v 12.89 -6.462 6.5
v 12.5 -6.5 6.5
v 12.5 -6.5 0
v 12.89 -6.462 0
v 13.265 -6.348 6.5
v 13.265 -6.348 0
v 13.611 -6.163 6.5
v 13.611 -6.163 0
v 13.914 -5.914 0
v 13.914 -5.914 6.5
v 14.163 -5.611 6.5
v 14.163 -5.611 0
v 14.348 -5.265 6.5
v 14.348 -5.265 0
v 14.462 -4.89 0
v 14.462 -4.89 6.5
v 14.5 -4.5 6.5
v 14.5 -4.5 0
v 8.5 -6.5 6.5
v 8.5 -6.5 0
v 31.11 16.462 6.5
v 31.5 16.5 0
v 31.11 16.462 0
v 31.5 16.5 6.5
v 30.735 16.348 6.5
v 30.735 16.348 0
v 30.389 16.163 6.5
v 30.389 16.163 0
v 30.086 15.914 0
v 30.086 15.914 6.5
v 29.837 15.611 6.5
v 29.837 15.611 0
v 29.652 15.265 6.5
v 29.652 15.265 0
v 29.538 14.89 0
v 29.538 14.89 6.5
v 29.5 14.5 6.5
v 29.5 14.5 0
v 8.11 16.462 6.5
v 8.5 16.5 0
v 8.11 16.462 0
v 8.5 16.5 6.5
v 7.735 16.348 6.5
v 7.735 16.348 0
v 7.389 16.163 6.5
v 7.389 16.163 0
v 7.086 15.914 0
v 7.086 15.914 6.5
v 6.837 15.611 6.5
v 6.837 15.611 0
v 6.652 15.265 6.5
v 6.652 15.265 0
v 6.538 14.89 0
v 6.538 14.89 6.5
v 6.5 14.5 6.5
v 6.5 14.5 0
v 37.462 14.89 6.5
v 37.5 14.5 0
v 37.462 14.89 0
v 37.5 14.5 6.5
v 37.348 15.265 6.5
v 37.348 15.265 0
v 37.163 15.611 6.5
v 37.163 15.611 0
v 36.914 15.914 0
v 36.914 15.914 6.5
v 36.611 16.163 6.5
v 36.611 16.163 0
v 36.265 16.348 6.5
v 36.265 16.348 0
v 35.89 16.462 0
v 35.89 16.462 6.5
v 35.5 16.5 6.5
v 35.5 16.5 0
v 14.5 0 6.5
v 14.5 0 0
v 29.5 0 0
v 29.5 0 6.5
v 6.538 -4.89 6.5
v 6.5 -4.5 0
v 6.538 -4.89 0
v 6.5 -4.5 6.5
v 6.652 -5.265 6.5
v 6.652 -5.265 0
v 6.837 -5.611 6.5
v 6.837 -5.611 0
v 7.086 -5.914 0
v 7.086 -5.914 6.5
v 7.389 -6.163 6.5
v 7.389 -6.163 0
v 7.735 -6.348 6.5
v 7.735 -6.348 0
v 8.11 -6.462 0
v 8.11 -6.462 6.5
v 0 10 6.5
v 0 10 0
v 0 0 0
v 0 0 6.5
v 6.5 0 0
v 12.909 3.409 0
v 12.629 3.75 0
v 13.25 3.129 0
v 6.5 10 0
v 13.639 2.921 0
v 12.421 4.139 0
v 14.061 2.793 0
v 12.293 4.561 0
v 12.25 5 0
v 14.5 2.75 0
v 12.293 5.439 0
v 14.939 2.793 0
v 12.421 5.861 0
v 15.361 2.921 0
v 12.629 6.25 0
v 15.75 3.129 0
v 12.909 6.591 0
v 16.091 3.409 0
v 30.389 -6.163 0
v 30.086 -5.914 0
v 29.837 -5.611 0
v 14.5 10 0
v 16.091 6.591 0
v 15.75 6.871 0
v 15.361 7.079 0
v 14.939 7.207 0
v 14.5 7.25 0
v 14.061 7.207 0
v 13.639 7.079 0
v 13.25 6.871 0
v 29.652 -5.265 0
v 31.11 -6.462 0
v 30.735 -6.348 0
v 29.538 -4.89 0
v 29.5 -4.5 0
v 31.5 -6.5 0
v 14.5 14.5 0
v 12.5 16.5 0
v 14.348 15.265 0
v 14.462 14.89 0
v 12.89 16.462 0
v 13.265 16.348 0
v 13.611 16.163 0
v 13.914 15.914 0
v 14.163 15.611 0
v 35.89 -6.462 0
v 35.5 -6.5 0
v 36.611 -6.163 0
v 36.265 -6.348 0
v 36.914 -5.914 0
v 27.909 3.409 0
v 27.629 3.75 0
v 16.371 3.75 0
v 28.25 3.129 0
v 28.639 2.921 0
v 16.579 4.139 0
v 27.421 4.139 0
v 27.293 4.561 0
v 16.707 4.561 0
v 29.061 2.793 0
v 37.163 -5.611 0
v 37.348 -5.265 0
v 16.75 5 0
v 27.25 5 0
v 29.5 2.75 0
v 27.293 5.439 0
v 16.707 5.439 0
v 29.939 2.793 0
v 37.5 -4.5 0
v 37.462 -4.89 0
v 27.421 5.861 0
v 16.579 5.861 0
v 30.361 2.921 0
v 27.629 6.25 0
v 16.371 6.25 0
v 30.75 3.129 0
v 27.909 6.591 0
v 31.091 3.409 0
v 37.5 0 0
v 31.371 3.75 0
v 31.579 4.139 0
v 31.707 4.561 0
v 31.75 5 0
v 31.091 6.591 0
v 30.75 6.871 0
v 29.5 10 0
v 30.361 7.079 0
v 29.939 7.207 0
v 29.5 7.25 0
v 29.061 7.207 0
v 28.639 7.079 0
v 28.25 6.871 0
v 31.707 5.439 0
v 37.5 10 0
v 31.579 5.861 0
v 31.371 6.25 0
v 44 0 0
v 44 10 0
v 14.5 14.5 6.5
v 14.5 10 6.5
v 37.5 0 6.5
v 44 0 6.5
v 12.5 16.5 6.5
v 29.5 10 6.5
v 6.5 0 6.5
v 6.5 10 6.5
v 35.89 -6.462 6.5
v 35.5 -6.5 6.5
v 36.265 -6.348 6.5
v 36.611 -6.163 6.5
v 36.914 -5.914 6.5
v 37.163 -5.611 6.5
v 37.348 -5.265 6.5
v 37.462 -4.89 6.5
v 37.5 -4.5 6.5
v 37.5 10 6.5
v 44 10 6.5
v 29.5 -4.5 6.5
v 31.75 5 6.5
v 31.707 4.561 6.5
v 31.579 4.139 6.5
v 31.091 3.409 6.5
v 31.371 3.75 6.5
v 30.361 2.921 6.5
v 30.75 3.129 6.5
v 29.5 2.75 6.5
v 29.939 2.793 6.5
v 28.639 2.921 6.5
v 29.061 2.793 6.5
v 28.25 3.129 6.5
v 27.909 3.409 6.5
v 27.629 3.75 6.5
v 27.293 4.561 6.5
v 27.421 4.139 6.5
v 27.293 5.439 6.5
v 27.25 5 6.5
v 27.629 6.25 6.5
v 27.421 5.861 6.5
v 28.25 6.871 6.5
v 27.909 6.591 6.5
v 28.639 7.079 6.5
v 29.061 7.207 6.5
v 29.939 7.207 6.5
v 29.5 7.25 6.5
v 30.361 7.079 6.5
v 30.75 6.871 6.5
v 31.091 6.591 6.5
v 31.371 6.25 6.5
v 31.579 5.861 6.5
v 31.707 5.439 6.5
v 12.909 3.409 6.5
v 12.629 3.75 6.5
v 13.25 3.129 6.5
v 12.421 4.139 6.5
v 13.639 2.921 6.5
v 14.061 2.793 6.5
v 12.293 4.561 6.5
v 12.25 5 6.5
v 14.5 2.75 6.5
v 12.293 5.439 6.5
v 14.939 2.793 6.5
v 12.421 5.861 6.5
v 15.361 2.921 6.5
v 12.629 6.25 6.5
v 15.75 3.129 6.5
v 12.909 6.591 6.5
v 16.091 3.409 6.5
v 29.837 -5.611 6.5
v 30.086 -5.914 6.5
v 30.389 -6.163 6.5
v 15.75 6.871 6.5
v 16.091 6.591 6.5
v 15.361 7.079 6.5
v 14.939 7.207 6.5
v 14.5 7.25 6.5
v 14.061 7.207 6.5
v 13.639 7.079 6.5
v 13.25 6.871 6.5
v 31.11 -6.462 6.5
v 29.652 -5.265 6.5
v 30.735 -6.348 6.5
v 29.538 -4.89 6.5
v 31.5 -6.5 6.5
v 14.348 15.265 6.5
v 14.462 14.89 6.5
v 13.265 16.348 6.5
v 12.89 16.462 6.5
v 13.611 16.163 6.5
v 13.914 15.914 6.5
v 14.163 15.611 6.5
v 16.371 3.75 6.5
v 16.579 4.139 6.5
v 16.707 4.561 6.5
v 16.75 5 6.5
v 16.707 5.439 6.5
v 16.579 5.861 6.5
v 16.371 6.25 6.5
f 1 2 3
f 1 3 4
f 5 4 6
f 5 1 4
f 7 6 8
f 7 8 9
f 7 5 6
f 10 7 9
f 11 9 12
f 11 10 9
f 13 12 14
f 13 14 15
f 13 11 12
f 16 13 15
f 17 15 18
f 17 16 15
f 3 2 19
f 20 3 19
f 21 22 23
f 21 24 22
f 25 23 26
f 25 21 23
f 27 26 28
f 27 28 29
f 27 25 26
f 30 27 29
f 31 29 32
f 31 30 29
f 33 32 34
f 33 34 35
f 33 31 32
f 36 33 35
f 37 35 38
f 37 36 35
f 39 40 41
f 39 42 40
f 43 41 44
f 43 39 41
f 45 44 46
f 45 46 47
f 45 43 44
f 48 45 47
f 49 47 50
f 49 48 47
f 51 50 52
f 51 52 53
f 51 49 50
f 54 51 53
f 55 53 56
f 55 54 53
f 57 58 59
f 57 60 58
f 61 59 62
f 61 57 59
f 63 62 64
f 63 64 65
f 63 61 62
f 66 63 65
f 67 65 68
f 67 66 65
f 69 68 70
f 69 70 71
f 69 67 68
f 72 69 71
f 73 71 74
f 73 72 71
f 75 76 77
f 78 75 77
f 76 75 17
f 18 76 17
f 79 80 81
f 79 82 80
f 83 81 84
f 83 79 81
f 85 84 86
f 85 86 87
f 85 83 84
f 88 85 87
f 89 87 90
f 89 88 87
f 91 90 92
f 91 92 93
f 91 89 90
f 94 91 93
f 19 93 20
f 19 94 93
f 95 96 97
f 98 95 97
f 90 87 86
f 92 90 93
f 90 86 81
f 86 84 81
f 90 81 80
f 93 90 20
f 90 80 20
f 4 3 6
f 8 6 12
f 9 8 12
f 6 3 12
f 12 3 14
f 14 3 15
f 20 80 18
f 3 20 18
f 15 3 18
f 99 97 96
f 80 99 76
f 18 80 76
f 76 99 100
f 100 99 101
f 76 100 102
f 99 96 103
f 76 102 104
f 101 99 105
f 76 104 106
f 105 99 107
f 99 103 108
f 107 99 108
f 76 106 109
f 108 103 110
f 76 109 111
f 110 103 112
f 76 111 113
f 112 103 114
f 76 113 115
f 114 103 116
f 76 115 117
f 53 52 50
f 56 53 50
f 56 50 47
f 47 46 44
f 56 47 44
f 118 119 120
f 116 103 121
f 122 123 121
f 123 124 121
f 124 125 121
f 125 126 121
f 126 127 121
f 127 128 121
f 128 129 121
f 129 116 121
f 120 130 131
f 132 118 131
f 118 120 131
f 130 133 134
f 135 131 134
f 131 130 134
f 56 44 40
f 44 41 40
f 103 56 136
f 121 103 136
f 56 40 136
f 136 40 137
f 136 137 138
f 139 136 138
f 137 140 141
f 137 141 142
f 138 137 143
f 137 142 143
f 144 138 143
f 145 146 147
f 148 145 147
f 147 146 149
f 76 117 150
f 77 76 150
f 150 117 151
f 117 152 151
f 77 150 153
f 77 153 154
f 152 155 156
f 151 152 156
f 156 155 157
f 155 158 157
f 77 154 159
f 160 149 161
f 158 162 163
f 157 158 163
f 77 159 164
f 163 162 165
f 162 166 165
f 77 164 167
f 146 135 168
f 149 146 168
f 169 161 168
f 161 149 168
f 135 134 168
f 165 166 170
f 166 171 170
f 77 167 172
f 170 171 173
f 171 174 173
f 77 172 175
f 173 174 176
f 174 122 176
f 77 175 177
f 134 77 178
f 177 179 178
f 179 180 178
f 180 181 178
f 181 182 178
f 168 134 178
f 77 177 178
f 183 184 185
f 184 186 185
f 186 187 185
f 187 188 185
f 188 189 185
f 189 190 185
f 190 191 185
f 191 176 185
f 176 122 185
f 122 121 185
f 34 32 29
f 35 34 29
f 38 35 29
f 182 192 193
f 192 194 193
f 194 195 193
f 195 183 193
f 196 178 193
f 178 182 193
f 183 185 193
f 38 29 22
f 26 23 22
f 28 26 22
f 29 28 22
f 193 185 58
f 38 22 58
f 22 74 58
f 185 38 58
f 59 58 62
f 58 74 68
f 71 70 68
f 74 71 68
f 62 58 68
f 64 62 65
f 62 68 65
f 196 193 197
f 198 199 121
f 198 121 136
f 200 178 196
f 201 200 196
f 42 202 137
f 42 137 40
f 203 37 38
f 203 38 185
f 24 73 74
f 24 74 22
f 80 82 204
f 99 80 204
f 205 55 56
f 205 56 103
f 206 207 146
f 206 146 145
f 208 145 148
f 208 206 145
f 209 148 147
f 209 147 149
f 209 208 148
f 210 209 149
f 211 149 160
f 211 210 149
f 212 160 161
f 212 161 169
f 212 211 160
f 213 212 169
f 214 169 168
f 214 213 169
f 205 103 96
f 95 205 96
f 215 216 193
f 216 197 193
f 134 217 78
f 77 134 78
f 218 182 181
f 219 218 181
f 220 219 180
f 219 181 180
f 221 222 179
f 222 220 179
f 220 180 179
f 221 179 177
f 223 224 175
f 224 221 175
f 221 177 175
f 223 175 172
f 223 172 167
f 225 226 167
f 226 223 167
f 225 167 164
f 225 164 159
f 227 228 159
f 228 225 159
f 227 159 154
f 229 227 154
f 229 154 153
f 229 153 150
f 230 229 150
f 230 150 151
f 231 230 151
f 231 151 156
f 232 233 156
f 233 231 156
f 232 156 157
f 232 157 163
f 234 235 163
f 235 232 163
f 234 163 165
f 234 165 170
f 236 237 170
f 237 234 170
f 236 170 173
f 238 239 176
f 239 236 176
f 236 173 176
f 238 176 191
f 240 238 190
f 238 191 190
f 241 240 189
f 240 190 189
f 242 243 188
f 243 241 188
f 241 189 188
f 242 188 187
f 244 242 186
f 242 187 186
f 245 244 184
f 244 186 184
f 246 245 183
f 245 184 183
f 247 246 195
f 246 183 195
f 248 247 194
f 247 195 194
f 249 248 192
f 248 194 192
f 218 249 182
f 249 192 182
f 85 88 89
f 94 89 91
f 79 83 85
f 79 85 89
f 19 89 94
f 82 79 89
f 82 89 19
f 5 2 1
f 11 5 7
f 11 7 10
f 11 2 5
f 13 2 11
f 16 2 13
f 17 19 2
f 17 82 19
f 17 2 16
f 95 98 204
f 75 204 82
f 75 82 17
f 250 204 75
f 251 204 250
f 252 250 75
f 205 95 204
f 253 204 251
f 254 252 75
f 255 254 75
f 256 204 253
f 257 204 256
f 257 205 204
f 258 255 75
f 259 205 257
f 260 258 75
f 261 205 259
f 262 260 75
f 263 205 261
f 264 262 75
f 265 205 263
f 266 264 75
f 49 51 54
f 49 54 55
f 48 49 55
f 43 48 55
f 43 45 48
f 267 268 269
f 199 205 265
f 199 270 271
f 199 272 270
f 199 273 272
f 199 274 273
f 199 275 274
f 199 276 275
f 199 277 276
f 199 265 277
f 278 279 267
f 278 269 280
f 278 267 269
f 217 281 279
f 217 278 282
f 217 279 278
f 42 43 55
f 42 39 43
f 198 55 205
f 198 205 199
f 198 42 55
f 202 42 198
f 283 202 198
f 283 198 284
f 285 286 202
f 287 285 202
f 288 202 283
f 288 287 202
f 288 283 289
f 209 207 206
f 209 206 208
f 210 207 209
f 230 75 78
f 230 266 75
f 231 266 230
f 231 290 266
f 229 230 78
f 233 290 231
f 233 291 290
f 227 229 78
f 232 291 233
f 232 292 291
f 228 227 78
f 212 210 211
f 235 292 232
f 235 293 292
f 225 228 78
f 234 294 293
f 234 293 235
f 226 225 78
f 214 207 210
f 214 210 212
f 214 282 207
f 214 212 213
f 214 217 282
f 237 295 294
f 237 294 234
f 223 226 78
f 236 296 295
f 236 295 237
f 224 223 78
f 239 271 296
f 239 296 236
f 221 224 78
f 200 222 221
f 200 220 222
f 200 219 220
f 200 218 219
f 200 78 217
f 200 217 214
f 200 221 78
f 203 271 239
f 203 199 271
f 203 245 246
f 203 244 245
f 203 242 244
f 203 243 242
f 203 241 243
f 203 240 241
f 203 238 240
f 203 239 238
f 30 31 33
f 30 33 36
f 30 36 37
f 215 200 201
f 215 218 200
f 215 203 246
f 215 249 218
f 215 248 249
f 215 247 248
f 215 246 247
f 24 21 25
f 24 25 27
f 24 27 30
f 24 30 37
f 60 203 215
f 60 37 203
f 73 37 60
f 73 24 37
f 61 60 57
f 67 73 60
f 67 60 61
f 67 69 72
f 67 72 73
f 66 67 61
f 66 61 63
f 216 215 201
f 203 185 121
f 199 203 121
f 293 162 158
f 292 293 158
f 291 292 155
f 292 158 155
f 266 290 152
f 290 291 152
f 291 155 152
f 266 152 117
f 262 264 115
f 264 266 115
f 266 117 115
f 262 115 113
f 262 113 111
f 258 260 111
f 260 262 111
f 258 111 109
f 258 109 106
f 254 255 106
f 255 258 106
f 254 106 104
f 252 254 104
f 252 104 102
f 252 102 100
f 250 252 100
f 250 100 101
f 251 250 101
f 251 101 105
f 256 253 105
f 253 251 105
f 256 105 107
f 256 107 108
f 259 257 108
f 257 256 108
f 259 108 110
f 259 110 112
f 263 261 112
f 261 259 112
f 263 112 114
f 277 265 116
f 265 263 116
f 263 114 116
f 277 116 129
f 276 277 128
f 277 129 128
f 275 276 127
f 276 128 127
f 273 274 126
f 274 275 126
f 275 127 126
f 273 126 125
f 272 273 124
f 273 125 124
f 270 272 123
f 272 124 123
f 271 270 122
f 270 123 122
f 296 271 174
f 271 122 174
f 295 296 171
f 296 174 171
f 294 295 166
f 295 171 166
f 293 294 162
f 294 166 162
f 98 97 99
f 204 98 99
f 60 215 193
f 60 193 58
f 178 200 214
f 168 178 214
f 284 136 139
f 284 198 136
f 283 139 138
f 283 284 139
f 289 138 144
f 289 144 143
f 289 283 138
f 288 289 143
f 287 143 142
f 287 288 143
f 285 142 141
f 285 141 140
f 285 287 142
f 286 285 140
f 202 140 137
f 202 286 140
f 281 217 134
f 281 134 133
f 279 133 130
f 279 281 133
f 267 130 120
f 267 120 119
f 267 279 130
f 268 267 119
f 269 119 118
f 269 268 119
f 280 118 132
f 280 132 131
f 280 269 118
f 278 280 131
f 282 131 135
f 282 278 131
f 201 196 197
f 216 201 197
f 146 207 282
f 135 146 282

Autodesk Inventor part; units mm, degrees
ref_plane "YZ Plane" through (0, 0, 0) normal (1, 0, 0) x (0, 1, 0)
ref_plane "XZ Plane" through (0, 0, 0) normal (0, 1, 0) x (-1, 0, 0)
ref_plane "XY Plane" through (0, 0, 0) normal (0, 0, 1) x (1, 0, 0)
sketch "Sketch1" plane through (0, 0, 0) normal (0, 0, 1) x (1, 0, 0)
  line L0 (0, 0) -> (44, 0)
  line L1 (44, 0) -> (44, 10)
  line L2 (44, 10) -> (0, 10)
  line L3 (0, 10) -> (0, 0)
  circle A0 centre (29.5, 5) radius 2.25
  circle A1 centre (14.5, 5) radius 2.25
  line L4 (14.5, 5) -> (29.5, 5) construction
  point P0 (0, 5)
  point P1 (22, 5)
  point P2 (22, 10)
  dimension "d0" = 10
  dimension "d1" = 44
  dimension "d2" = 4.5
  dimension "d13" = 4.5
  dimension "d14" = 15
extrude "Extrusion3" add sketch "Sketch1" along normal blind 6.5
sketch "Sketch3" plane through (0, 0, 6.5) normal (0, 0, 1) x (1, 0, 0)
  line L0 (0, 0) -> (44, 0) projected
  line L1 (44, 10) -> (0, 10) projected
  line L2 (6.5, 10) -> (14.5, 10)
  line L3 (14.5, 10) -> (14.5, 14.5)
  line L4 (12.5, 16.5) -> (8.5, 16.5)
  line L5 (6.5, 14.5) -> (6.5, 10)
  line L6 (29.5, 10) -> (37.5, 10)
  line L7 (37.5, 10) -> (37.5, 14.5)
  line L8 (35.5, 16.5) -> (31.5, 16.5)
  line L9 (29.5, 14.5) -> (29.5, 10)
  line L10 (6.5, 0) -> (14.5, 0)
  line L11 (14.5, 0) -> (14.5, -4.5)
  line L12 (12.5, -6.5) -> (8.5, -6.5)
  line L13 (6.5, -4.5) -> (6.5, 0)
  line L14 (29.5, 0) -> (37.5, 0)
  line L15 (37.5, 0) -> (37.5, -4.5)
  line L16 (35.5, -6.5) -> (31.5, -6.5)
  line L17 (29.5, -4.5) -> (29.5, 0)
  arc A0 (8.5, 16.5) -> (6.5, 14.5) centre (8.5, 14.5) ccw
  arc A1 (14.5, 14.5) -> (12.5, 16.5) centre (12.5, 14.5) ccw
  arc A2 (31.5, 16.5) -> (29.5, 14.5) centre (31.5, 14.5) ccw
  arc A3 (37.5, 14.5) -> (35.5, 16.5) centre (35.5, 14.5) ccw
  arc A4 (6.5, -4.5) -> (8.5, -6.5) centre (8.5, -4.5) ccw
  arc A5 (12.5, -6.5) -> (14.5, -4.5) centre (12.5, -4.5) ccw
  arc A6 (29.5, -4.5) -> (31.5, -6.5) centre (31.5, -4.5) ccw
  arc A7 (35.5, -6.5) -> (37.5, -4.5) centre (35.5, -4.5) ccw
  line L18 (14.5, 12.5251) -> (29.5, 12.5251) construction
  point P0 (22, 12.5251)
  point P1 (22, 10)
  dimension "d17" = 2
  dimension "d18" = 8
  dimension "d19" = 8
  dimension "d20" = 6.5
  dimension "d21" = 6.5
  dimension "d22" = 15
extrude "Extrusion4" add sketch "Sketch3" against normal blind 6.5
equation "\"d20\" = d21"
properties part number "y_carriage_belt_mount_bed_holder" material "Plywood, Finish"
